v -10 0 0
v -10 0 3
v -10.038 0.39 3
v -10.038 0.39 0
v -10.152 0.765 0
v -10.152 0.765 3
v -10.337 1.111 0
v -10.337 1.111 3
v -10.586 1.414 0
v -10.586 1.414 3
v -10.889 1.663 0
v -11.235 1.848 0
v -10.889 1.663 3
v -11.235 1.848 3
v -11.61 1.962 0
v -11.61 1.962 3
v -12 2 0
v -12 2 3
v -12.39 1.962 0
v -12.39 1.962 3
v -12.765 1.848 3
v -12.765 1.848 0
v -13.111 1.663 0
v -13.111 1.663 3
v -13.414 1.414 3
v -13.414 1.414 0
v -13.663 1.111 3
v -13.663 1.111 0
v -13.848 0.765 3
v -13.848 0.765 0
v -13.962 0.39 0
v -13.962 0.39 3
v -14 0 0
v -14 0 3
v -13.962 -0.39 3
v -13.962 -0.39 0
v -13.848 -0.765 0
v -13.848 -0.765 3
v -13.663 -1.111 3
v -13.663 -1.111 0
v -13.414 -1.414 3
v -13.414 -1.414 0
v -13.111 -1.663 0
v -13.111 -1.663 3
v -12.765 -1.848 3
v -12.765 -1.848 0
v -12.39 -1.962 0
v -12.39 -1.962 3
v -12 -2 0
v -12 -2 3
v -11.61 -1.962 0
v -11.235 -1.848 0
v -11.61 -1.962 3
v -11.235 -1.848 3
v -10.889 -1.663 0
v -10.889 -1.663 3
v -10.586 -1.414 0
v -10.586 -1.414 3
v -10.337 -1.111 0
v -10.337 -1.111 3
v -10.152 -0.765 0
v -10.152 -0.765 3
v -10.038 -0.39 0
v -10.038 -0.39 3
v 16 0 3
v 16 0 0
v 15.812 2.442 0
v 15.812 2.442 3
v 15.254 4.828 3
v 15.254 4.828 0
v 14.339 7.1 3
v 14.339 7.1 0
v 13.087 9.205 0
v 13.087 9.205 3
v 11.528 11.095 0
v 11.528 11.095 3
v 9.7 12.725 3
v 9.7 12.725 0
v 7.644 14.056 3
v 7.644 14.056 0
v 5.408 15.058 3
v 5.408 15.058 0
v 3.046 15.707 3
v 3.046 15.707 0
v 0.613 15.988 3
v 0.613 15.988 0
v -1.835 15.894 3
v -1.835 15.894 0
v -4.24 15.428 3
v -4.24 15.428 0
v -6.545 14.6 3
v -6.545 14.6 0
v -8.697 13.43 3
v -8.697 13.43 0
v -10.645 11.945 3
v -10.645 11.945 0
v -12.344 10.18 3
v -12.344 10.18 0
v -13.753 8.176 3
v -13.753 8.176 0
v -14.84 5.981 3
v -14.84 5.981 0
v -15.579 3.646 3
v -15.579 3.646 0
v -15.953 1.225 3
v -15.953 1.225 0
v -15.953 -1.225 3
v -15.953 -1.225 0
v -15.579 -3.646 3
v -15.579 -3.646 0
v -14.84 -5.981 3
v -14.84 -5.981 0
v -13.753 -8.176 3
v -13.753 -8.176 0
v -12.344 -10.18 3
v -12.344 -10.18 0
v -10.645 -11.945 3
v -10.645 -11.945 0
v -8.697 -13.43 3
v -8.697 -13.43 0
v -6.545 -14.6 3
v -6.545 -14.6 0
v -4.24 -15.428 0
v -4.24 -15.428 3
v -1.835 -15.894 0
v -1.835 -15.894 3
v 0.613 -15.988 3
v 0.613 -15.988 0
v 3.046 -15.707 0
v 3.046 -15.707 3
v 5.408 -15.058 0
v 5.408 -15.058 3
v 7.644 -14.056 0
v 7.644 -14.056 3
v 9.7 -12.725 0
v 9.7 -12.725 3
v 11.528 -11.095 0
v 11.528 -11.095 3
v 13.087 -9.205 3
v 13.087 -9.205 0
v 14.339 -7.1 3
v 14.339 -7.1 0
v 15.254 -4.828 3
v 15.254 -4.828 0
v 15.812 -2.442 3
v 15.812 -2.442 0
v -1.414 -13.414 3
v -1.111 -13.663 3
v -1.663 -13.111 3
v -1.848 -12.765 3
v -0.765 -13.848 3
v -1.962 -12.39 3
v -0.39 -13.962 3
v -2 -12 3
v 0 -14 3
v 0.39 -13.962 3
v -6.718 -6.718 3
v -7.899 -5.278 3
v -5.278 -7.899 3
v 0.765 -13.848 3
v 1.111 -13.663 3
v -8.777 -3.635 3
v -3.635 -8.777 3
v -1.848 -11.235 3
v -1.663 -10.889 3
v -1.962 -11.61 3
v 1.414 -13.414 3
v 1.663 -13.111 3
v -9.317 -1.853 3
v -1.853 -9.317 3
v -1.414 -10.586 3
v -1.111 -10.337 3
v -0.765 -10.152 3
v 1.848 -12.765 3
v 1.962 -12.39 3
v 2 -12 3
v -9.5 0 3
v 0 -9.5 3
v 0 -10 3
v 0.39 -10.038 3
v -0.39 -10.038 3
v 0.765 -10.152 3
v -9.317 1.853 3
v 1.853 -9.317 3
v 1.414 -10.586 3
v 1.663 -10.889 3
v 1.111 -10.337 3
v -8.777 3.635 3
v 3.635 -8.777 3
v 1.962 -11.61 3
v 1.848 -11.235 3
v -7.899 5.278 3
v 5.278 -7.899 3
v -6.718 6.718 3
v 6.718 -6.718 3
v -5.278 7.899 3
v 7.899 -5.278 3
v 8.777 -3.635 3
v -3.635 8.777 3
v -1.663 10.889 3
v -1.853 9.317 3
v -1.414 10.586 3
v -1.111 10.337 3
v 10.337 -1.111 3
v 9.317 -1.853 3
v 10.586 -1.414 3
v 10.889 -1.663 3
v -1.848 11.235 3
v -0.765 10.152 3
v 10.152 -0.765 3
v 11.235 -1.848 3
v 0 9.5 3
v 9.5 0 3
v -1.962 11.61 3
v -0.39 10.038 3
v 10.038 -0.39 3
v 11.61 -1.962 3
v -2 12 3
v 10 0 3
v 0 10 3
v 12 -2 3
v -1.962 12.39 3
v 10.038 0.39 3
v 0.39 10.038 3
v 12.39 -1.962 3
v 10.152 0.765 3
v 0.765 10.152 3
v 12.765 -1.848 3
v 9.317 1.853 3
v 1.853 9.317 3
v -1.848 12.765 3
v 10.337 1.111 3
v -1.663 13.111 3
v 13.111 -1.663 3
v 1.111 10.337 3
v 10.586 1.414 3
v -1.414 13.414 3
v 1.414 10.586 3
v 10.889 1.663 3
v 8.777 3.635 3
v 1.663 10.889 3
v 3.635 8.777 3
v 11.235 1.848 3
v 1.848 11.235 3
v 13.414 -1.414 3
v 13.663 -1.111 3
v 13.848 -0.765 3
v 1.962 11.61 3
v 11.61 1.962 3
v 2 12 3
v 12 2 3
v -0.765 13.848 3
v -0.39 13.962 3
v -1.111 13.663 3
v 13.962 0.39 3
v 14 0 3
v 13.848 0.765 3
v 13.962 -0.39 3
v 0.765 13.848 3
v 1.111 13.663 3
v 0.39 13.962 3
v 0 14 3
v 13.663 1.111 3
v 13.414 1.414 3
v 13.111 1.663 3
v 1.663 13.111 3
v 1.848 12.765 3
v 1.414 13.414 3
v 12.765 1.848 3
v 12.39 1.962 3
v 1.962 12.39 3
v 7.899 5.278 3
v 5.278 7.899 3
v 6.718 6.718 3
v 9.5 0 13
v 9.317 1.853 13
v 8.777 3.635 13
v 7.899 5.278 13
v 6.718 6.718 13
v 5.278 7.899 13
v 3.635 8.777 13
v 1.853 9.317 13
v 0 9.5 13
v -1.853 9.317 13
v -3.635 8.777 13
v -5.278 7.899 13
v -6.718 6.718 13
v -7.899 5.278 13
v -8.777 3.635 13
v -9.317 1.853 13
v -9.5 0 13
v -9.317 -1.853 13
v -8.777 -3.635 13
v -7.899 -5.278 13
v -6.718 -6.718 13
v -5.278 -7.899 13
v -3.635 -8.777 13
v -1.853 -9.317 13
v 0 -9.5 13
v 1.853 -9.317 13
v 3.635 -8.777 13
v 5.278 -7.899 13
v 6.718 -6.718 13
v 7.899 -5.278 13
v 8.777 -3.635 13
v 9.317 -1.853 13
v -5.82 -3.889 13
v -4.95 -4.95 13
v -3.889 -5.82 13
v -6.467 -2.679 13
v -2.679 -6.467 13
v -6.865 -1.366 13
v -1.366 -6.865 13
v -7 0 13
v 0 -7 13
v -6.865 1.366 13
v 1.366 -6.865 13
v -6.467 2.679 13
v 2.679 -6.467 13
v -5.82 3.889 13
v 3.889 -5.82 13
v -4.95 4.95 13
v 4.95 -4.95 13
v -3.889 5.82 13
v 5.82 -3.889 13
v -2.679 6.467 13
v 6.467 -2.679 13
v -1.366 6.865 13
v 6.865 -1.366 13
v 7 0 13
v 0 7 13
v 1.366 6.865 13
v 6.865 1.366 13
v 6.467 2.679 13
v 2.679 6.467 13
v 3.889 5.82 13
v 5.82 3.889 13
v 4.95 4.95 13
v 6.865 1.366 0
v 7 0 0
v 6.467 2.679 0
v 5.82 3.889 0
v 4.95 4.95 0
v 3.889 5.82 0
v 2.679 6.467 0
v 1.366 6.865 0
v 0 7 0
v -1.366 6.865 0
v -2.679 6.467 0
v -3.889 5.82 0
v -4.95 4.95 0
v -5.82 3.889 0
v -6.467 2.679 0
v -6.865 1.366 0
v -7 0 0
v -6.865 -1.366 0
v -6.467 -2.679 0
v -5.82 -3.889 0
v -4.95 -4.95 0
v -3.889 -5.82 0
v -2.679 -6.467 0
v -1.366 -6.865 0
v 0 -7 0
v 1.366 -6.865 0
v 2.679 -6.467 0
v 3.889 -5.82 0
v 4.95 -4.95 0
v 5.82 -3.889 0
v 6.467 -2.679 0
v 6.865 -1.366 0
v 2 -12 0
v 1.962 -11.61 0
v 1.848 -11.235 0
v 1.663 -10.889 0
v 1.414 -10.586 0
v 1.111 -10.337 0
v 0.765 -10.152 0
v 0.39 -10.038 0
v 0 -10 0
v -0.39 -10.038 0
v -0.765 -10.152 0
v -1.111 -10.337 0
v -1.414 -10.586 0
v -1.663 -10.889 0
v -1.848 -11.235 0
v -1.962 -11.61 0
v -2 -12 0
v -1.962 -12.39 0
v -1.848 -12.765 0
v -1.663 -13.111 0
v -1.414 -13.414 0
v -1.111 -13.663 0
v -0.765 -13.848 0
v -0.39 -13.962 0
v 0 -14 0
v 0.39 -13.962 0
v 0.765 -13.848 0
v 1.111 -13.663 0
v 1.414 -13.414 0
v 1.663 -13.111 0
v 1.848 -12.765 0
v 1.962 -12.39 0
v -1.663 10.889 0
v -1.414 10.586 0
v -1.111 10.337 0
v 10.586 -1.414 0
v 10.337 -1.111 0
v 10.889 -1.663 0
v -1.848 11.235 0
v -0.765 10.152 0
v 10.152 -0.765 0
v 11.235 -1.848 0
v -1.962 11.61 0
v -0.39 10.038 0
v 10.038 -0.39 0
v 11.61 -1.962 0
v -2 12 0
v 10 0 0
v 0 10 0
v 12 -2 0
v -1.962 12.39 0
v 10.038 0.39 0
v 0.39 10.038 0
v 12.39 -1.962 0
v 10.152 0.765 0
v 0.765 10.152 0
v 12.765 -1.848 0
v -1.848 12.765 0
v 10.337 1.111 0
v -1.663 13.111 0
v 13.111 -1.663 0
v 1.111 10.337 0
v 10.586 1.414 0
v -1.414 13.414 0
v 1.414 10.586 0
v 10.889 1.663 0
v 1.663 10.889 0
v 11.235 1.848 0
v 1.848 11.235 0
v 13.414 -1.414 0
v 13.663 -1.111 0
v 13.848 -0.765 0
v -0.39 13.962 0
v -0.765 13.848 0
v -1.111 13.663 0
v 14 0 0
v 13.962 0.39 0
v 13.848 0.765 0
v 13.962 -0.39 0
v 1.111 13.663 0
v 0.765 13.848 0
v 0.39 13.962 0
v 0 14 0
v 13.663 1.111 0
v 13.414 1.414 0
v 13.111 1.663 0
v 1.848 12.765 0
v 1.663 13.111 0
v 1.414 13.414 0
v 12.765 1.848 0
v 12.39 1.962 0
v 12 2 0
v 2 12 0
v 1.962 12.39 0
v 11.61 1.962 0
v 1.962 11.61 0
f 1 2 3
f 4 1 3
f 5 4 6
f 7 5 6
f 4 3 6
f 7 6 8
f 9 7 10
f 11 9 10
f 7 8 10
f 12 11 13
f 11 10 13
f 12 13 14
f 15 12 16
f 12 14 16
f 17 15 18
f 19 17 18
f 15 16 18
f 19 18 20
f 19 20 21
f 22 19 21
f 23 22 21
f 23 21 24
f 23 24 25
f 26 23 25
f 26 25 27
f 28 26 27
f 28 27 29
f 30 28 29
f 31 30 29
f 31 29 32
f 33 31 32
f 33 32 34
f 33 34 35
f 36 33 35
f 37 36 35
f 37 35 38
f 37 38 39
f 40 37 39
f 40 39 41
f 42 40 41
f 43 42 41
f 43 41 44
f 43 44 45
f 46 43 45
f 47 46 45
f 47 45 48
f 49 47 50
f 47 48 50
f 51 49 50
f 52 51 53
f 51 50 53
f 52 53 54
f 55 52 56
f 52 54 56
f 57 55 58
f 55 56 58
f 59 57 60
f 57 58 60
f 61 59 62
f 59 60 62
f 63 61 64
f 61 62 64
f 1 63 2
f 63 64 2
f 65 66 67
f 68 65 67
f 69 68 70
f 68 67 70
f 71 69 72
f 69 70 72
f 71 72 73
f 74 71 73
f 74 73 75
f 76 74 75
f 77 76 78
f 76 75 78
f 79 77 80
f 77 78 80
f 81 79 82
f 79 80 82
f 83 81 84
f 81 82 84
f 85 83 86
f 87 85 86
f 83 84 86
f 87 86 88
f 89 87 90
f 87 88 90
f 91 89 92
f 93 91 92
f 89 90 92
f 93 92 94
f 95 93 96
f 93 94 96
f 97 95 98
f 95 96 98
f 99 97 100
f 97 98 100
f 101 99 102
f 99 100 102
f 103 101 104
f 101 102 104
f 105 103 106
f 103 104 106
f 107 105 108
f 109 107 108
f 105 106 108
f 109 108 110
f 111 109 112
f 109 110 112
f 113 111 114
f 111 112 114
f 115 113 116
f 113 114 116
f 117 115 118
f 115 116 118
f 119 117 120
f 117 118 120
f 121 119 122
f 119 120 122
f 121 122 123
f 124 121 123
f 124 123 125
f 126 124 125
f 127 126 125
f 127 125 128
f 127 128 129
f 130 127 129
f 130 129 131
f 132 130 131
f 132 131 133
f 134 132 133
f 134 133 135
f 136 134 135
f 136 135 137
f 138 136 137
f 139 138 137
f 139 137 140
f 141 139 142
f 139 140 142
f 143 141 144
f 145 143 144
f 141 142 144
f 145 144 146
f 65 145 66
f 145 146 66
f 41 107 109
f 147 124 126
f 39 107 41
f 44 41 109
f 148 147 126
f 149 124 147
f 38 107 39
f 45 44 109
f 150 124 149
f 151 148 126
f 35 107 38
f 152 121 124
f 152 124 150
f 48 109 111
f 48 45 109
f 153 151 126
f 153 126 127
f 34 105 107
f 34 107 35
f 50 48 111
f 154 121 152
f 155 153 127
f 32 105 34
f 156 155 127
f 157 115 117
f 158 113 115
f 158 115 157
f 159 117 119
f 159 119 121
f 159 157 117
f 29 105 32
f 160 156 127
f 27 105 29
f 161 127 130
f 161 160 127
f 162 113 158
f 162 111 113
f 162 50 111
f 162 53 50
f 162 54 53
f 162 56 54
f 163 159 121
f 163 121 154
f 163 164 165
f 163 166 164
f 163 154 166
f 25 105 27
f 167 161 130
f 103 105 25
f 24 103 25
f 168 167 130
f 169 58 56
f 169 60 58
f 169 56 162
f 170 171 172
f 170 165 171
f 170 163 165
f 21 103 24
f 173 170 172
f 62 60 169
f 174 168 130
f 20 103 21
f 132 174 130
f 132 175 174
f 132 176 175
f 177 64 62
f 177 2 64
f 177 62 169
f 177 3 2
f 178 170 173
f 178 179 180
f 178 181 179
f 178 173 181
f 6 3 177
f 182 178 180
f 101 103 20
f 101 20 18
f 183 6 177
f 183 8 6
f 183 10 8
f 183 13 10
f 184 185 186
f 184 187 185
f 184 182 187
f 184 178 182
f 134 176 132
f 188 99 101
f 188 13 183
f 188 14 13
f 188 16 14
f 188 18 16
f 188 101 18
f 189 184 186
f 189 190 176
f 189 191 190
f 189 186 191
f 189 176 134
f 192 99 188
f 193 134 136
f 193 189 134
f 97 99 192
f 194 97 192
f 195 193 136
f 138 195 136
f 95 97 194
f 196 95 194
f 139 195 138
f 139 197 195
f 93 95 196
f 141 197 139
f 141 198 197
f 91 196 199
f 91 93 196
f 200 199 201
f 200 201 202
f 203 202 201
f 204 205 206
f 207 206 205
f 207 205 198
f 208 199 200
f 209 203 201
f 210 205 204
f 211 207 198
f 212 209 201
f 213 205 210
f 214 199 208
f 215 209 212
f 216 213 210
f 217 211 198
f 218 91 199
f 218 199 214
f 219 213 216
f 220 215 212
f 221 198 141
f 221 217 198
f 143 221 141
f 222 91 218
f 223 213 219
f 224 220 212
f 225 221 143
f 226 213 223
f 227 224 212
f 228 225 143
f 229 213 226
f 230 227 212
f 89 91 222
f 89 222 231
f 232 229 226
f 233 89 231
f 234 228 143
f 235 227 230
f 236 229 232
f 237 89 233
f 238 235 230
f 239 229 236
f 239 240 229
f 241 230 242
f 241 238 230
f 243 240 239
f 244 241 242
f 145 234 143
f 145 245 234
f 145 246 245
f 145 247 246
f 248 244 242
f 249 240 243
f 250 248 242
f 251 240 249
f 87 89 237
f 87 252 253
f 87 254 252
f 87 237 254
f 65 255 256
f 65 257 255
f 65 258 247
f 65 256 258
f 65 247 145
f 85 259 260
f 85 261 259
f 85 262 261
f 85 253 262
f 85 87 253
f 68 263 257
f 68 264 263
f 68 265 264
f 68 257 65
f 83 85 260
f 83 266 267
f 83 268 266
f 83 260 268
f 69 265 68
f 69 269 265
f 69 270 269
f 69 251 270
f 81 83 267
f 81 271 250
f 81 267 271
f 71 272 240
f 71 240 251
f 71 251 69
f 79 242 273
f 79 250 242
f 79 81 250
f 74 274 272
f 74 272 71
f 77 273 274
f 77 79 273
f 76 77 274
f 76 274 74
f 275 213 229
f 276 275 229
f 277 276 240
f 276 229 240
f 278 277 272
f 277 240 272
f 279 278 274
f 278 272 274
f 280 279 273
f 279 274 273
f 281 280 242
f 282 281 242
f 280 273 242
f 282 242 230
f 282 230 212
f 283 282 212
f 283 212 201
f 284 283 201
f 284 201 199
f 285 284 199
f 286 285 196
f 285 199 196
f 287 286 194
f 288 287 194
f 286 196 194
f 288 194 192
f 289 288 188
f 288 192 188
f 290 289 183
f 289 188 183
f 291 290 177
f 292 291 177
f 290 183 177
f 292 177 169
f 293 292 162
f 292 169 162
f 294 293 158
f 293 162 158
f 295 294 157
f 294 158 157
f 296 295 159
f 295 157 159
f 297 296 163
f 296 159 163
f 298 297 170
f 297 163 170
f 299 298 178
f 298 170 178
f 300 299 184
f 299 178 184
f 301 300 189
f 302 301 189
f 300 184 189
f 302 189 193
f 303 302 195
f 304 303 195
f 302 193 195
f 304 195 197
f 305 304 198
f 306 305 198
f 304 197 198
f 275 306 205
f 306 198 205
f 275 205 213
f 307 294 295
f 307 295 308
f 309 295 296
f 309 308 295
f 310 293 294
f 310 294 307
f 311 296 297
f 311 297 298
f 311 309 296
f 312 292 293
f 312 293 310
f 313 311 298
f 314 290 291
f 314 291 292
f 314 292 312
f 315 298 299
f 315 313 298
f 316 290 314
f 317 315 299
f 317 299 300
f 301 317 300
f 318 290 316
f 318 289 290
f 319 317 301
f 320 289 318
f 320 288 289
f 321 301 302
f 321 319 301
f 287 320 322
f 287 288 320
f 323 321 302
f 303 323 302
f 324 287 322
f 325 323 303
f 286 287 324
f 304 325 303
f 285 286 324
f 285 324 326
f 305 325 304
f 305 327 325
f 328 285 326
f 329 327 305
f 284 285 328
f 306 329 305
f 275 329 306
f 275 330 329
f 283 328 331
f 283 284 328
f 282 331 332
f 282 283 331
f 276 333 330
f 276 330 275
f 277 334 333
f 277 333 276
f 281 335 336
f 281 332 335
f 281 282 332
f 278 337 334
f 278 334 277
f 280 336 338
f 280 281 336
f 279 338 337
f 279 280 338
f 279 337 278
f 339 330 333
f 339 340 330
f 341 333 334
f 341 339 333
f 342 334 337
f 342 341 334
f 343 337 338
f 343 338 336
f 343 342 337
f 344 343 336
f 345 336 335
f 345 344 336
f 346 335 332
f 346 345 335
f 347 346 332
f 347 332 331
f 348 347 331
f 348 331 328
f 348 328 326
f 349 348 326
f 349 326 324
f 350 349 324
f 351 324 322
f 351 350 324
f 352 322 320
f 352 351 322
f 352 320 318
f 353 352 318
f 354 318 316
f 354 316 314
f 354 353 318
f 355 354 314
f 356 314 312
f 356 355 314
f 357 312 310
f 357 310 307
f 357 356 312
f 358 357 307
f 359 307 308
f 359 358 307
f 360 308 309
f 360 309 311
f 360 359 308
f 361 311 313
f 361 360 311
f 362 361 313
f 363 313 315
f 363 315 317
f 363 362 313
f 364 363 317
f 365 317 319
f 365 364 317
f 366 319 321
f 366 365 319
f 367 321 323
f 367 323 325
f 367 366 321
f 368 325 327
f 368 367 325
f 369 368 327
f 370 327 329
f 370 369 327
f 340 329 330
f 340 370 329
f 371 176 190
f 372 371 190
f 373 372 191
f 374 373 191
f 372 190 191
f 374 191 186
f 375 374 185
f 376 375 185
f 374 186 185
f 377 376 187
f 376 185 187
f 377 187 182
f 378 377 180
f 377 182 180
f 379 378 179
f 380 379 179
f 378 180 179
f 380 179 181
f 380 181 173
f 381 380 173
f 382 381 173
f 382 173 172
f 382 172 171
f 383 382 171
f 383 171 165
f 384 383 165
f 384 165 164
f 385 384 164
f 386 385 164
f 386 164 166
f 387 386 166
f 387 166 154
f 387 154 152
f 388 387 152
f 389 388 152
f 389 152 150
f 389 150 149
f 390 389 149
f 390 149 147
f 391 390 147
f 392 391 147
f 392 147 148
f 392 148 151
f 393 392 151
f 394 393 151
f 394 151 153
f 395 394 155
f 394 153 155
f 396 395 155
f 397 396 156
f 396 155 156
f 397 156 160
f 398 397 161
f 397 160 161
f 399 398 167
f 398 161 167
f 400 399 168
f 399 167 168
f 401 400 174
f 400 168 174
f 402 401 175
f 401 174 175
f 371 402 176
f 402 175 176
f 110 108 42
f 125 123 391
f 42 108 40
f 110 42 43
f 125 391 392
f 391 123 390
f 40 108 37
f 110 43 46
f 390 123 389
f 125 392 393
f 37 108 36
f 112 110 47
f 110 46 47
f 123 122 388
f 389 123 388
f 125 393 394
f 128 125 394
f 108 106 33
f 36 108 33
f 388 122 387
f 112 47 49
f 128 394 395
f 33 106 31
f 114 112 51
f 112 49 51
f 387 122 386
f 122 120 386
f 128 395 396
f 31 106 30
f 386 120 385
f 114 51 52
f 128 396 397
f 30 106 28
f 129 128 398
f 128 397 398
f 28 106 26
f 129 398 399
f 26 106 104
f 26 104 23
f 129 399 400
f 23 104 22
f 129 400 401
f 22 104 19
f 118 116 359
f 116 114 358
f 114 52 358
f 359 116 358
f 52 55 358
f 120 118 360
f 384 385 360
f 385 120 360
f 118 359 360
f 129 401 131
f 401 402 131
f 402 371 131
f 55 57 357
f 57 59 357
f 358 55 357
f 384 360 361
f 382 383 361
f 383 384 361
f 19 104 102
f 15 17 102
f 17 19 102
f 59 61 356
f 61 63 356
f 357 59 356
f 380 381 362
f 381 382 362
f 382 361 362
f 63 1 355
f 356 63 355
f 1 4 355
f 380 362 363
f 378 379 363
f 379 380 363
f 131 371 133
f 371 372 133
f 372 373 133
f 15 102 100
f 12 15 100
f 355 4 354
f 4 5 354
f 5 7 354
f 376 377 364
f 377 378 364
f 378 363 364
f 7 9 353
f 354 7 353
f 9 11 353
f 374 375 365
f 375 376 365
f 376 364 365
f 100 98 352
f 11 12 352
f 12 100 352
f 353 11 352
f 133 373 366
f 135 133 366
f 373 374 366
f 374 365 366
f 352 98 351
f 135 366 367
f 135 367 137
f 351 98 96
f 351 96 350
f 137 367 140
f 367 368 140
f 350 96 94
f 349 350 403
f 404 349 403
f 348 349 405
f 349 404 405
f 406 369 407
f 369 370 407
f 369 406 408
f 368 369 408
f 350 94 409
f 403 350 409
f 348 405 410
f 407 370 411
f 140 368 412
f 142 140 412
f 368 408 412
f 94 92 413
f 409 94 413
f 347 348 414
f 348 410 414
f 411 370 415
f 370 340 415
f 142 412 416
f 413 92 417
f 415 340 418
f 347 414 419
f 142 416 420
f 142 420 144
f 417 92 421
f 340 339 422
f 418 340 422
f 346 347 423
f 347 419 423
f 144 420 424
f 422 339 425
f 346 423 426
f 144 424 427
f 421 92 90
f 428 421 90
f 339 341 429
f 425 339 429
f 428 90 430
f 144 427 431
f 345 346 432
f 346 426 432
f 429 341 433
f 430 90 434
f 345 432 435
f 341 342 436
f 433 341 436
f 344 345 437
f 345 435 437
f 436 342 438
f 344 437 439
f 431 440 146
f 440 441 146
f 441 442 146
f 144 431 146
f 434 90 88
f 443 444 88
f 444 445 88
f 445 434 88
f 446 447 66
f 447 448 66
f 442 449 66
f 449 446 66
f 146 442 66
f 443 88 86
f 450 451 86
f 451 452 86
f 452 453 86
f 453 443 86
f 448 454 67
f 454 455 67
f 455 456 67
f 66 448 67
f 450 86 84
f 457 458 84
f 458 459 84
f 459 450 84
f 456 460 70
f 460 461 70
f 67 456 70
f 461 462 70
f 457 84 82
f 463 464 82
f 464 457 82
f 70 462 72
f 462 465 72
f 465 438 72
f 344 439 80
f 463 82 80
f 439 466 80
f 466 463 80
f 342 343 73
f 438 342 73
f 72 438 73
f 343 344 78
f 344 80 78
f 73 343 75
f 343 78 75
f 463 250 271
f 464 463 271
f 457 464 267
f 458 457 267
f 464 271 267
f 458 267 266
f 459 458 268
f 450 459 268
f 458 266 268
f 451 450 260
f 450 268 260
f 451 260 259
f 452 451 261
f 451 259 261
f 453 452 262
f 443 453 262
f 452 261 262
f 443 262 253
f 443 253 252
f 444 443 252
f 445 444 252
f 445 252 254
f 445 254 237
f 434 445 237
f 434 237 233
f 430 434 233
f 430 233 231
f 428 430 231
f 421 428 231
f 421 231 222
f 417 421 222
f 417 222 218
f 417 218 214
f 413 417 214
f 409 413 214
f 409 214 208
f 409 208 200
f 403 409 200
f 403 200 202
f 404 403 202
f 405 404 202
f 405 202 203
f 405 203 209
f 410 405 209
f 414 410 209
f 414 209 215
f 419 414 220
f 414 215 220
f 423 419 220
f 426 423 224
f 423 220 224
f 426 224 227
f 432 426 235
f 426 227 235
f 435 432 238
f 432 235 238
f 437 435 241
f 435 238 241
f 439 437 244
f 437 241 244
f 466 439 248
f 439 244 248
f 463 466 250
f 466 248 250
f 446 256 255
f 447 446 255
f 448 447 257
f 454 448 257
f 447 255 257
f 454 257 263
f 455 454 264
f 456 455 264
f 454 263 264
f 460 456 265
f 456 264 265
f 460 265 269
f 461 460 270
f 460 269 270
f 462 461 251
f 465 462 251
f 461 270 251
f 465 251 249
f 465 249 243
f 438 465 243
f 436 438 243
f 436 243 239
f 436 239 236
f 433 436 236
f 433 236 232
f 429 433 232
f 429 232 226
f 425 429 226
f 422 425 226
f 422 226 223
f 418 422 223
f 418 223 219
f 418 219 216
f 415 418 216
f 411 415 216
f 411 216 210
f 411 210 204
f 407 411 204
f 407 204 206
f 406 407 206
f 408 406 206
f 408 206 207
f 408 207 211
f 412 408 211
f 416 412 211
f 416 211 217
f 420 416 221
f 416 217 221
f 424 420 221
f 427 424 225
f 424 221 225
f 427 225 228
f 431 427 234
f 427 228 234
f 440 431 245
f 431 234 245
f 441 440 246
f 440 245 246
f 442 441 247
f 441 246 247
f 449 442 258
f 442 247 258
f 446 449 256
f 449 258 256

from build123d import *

# Parameters (mm, degrees)
SKETCH_1_R          = 16
SKETCH_1_R_2        = 7
EXTRUDE_1_DEPTH     = 3
SKETCH_2_R          = 9.5
SKETCH_2_R_2        = 7
EXTRUDE_2_DEPTH     = 10
SKETCH_3_R          = 2
CUT_EXTRUDE_1_DEPTH = 10


with BuildPart() as part:
    # 草图1 → 凸台-拉伸1 (new body)
    with BuildSketch(Plane.XY):
        Circle(SKETCH_1_R)
        Circle(SKETCH_1_R_2, mode=Mode.SUBTRACT)
    extrude(amount=EXTRUDE_1_DEPTH)

    # 草图2 → 凸台-拉伸2 (add)
    with BuildSketch(Plane.XY.offset(3)):
        Circle(SKETCH_2_R)
        Circle(SKETCH_2_R_2, mode=Mode.SUBTRACT)
    extrude(amount=EXTRUDE_2_DEPTH)

    # 草图3 → 切除-拉伸1 (cut)
    with BuildSketch(Plane.XY.offset(3)):
        with Locations((0, -12)):
            Circle(SKETCH_3_R)
        with Locations((-12, 0)):
            Circle(SKETCH_3_R)
        with Locations((0, 12)):
            Circle(SKETCH_3_R)
        with Locations((12, 0)):
            Circle(SKETCH_3_R)
    extrude(amount=-CUT_EXTRUDE_1_DEPTH, mode=Mode.SUBTRACT)


solid = part.part
